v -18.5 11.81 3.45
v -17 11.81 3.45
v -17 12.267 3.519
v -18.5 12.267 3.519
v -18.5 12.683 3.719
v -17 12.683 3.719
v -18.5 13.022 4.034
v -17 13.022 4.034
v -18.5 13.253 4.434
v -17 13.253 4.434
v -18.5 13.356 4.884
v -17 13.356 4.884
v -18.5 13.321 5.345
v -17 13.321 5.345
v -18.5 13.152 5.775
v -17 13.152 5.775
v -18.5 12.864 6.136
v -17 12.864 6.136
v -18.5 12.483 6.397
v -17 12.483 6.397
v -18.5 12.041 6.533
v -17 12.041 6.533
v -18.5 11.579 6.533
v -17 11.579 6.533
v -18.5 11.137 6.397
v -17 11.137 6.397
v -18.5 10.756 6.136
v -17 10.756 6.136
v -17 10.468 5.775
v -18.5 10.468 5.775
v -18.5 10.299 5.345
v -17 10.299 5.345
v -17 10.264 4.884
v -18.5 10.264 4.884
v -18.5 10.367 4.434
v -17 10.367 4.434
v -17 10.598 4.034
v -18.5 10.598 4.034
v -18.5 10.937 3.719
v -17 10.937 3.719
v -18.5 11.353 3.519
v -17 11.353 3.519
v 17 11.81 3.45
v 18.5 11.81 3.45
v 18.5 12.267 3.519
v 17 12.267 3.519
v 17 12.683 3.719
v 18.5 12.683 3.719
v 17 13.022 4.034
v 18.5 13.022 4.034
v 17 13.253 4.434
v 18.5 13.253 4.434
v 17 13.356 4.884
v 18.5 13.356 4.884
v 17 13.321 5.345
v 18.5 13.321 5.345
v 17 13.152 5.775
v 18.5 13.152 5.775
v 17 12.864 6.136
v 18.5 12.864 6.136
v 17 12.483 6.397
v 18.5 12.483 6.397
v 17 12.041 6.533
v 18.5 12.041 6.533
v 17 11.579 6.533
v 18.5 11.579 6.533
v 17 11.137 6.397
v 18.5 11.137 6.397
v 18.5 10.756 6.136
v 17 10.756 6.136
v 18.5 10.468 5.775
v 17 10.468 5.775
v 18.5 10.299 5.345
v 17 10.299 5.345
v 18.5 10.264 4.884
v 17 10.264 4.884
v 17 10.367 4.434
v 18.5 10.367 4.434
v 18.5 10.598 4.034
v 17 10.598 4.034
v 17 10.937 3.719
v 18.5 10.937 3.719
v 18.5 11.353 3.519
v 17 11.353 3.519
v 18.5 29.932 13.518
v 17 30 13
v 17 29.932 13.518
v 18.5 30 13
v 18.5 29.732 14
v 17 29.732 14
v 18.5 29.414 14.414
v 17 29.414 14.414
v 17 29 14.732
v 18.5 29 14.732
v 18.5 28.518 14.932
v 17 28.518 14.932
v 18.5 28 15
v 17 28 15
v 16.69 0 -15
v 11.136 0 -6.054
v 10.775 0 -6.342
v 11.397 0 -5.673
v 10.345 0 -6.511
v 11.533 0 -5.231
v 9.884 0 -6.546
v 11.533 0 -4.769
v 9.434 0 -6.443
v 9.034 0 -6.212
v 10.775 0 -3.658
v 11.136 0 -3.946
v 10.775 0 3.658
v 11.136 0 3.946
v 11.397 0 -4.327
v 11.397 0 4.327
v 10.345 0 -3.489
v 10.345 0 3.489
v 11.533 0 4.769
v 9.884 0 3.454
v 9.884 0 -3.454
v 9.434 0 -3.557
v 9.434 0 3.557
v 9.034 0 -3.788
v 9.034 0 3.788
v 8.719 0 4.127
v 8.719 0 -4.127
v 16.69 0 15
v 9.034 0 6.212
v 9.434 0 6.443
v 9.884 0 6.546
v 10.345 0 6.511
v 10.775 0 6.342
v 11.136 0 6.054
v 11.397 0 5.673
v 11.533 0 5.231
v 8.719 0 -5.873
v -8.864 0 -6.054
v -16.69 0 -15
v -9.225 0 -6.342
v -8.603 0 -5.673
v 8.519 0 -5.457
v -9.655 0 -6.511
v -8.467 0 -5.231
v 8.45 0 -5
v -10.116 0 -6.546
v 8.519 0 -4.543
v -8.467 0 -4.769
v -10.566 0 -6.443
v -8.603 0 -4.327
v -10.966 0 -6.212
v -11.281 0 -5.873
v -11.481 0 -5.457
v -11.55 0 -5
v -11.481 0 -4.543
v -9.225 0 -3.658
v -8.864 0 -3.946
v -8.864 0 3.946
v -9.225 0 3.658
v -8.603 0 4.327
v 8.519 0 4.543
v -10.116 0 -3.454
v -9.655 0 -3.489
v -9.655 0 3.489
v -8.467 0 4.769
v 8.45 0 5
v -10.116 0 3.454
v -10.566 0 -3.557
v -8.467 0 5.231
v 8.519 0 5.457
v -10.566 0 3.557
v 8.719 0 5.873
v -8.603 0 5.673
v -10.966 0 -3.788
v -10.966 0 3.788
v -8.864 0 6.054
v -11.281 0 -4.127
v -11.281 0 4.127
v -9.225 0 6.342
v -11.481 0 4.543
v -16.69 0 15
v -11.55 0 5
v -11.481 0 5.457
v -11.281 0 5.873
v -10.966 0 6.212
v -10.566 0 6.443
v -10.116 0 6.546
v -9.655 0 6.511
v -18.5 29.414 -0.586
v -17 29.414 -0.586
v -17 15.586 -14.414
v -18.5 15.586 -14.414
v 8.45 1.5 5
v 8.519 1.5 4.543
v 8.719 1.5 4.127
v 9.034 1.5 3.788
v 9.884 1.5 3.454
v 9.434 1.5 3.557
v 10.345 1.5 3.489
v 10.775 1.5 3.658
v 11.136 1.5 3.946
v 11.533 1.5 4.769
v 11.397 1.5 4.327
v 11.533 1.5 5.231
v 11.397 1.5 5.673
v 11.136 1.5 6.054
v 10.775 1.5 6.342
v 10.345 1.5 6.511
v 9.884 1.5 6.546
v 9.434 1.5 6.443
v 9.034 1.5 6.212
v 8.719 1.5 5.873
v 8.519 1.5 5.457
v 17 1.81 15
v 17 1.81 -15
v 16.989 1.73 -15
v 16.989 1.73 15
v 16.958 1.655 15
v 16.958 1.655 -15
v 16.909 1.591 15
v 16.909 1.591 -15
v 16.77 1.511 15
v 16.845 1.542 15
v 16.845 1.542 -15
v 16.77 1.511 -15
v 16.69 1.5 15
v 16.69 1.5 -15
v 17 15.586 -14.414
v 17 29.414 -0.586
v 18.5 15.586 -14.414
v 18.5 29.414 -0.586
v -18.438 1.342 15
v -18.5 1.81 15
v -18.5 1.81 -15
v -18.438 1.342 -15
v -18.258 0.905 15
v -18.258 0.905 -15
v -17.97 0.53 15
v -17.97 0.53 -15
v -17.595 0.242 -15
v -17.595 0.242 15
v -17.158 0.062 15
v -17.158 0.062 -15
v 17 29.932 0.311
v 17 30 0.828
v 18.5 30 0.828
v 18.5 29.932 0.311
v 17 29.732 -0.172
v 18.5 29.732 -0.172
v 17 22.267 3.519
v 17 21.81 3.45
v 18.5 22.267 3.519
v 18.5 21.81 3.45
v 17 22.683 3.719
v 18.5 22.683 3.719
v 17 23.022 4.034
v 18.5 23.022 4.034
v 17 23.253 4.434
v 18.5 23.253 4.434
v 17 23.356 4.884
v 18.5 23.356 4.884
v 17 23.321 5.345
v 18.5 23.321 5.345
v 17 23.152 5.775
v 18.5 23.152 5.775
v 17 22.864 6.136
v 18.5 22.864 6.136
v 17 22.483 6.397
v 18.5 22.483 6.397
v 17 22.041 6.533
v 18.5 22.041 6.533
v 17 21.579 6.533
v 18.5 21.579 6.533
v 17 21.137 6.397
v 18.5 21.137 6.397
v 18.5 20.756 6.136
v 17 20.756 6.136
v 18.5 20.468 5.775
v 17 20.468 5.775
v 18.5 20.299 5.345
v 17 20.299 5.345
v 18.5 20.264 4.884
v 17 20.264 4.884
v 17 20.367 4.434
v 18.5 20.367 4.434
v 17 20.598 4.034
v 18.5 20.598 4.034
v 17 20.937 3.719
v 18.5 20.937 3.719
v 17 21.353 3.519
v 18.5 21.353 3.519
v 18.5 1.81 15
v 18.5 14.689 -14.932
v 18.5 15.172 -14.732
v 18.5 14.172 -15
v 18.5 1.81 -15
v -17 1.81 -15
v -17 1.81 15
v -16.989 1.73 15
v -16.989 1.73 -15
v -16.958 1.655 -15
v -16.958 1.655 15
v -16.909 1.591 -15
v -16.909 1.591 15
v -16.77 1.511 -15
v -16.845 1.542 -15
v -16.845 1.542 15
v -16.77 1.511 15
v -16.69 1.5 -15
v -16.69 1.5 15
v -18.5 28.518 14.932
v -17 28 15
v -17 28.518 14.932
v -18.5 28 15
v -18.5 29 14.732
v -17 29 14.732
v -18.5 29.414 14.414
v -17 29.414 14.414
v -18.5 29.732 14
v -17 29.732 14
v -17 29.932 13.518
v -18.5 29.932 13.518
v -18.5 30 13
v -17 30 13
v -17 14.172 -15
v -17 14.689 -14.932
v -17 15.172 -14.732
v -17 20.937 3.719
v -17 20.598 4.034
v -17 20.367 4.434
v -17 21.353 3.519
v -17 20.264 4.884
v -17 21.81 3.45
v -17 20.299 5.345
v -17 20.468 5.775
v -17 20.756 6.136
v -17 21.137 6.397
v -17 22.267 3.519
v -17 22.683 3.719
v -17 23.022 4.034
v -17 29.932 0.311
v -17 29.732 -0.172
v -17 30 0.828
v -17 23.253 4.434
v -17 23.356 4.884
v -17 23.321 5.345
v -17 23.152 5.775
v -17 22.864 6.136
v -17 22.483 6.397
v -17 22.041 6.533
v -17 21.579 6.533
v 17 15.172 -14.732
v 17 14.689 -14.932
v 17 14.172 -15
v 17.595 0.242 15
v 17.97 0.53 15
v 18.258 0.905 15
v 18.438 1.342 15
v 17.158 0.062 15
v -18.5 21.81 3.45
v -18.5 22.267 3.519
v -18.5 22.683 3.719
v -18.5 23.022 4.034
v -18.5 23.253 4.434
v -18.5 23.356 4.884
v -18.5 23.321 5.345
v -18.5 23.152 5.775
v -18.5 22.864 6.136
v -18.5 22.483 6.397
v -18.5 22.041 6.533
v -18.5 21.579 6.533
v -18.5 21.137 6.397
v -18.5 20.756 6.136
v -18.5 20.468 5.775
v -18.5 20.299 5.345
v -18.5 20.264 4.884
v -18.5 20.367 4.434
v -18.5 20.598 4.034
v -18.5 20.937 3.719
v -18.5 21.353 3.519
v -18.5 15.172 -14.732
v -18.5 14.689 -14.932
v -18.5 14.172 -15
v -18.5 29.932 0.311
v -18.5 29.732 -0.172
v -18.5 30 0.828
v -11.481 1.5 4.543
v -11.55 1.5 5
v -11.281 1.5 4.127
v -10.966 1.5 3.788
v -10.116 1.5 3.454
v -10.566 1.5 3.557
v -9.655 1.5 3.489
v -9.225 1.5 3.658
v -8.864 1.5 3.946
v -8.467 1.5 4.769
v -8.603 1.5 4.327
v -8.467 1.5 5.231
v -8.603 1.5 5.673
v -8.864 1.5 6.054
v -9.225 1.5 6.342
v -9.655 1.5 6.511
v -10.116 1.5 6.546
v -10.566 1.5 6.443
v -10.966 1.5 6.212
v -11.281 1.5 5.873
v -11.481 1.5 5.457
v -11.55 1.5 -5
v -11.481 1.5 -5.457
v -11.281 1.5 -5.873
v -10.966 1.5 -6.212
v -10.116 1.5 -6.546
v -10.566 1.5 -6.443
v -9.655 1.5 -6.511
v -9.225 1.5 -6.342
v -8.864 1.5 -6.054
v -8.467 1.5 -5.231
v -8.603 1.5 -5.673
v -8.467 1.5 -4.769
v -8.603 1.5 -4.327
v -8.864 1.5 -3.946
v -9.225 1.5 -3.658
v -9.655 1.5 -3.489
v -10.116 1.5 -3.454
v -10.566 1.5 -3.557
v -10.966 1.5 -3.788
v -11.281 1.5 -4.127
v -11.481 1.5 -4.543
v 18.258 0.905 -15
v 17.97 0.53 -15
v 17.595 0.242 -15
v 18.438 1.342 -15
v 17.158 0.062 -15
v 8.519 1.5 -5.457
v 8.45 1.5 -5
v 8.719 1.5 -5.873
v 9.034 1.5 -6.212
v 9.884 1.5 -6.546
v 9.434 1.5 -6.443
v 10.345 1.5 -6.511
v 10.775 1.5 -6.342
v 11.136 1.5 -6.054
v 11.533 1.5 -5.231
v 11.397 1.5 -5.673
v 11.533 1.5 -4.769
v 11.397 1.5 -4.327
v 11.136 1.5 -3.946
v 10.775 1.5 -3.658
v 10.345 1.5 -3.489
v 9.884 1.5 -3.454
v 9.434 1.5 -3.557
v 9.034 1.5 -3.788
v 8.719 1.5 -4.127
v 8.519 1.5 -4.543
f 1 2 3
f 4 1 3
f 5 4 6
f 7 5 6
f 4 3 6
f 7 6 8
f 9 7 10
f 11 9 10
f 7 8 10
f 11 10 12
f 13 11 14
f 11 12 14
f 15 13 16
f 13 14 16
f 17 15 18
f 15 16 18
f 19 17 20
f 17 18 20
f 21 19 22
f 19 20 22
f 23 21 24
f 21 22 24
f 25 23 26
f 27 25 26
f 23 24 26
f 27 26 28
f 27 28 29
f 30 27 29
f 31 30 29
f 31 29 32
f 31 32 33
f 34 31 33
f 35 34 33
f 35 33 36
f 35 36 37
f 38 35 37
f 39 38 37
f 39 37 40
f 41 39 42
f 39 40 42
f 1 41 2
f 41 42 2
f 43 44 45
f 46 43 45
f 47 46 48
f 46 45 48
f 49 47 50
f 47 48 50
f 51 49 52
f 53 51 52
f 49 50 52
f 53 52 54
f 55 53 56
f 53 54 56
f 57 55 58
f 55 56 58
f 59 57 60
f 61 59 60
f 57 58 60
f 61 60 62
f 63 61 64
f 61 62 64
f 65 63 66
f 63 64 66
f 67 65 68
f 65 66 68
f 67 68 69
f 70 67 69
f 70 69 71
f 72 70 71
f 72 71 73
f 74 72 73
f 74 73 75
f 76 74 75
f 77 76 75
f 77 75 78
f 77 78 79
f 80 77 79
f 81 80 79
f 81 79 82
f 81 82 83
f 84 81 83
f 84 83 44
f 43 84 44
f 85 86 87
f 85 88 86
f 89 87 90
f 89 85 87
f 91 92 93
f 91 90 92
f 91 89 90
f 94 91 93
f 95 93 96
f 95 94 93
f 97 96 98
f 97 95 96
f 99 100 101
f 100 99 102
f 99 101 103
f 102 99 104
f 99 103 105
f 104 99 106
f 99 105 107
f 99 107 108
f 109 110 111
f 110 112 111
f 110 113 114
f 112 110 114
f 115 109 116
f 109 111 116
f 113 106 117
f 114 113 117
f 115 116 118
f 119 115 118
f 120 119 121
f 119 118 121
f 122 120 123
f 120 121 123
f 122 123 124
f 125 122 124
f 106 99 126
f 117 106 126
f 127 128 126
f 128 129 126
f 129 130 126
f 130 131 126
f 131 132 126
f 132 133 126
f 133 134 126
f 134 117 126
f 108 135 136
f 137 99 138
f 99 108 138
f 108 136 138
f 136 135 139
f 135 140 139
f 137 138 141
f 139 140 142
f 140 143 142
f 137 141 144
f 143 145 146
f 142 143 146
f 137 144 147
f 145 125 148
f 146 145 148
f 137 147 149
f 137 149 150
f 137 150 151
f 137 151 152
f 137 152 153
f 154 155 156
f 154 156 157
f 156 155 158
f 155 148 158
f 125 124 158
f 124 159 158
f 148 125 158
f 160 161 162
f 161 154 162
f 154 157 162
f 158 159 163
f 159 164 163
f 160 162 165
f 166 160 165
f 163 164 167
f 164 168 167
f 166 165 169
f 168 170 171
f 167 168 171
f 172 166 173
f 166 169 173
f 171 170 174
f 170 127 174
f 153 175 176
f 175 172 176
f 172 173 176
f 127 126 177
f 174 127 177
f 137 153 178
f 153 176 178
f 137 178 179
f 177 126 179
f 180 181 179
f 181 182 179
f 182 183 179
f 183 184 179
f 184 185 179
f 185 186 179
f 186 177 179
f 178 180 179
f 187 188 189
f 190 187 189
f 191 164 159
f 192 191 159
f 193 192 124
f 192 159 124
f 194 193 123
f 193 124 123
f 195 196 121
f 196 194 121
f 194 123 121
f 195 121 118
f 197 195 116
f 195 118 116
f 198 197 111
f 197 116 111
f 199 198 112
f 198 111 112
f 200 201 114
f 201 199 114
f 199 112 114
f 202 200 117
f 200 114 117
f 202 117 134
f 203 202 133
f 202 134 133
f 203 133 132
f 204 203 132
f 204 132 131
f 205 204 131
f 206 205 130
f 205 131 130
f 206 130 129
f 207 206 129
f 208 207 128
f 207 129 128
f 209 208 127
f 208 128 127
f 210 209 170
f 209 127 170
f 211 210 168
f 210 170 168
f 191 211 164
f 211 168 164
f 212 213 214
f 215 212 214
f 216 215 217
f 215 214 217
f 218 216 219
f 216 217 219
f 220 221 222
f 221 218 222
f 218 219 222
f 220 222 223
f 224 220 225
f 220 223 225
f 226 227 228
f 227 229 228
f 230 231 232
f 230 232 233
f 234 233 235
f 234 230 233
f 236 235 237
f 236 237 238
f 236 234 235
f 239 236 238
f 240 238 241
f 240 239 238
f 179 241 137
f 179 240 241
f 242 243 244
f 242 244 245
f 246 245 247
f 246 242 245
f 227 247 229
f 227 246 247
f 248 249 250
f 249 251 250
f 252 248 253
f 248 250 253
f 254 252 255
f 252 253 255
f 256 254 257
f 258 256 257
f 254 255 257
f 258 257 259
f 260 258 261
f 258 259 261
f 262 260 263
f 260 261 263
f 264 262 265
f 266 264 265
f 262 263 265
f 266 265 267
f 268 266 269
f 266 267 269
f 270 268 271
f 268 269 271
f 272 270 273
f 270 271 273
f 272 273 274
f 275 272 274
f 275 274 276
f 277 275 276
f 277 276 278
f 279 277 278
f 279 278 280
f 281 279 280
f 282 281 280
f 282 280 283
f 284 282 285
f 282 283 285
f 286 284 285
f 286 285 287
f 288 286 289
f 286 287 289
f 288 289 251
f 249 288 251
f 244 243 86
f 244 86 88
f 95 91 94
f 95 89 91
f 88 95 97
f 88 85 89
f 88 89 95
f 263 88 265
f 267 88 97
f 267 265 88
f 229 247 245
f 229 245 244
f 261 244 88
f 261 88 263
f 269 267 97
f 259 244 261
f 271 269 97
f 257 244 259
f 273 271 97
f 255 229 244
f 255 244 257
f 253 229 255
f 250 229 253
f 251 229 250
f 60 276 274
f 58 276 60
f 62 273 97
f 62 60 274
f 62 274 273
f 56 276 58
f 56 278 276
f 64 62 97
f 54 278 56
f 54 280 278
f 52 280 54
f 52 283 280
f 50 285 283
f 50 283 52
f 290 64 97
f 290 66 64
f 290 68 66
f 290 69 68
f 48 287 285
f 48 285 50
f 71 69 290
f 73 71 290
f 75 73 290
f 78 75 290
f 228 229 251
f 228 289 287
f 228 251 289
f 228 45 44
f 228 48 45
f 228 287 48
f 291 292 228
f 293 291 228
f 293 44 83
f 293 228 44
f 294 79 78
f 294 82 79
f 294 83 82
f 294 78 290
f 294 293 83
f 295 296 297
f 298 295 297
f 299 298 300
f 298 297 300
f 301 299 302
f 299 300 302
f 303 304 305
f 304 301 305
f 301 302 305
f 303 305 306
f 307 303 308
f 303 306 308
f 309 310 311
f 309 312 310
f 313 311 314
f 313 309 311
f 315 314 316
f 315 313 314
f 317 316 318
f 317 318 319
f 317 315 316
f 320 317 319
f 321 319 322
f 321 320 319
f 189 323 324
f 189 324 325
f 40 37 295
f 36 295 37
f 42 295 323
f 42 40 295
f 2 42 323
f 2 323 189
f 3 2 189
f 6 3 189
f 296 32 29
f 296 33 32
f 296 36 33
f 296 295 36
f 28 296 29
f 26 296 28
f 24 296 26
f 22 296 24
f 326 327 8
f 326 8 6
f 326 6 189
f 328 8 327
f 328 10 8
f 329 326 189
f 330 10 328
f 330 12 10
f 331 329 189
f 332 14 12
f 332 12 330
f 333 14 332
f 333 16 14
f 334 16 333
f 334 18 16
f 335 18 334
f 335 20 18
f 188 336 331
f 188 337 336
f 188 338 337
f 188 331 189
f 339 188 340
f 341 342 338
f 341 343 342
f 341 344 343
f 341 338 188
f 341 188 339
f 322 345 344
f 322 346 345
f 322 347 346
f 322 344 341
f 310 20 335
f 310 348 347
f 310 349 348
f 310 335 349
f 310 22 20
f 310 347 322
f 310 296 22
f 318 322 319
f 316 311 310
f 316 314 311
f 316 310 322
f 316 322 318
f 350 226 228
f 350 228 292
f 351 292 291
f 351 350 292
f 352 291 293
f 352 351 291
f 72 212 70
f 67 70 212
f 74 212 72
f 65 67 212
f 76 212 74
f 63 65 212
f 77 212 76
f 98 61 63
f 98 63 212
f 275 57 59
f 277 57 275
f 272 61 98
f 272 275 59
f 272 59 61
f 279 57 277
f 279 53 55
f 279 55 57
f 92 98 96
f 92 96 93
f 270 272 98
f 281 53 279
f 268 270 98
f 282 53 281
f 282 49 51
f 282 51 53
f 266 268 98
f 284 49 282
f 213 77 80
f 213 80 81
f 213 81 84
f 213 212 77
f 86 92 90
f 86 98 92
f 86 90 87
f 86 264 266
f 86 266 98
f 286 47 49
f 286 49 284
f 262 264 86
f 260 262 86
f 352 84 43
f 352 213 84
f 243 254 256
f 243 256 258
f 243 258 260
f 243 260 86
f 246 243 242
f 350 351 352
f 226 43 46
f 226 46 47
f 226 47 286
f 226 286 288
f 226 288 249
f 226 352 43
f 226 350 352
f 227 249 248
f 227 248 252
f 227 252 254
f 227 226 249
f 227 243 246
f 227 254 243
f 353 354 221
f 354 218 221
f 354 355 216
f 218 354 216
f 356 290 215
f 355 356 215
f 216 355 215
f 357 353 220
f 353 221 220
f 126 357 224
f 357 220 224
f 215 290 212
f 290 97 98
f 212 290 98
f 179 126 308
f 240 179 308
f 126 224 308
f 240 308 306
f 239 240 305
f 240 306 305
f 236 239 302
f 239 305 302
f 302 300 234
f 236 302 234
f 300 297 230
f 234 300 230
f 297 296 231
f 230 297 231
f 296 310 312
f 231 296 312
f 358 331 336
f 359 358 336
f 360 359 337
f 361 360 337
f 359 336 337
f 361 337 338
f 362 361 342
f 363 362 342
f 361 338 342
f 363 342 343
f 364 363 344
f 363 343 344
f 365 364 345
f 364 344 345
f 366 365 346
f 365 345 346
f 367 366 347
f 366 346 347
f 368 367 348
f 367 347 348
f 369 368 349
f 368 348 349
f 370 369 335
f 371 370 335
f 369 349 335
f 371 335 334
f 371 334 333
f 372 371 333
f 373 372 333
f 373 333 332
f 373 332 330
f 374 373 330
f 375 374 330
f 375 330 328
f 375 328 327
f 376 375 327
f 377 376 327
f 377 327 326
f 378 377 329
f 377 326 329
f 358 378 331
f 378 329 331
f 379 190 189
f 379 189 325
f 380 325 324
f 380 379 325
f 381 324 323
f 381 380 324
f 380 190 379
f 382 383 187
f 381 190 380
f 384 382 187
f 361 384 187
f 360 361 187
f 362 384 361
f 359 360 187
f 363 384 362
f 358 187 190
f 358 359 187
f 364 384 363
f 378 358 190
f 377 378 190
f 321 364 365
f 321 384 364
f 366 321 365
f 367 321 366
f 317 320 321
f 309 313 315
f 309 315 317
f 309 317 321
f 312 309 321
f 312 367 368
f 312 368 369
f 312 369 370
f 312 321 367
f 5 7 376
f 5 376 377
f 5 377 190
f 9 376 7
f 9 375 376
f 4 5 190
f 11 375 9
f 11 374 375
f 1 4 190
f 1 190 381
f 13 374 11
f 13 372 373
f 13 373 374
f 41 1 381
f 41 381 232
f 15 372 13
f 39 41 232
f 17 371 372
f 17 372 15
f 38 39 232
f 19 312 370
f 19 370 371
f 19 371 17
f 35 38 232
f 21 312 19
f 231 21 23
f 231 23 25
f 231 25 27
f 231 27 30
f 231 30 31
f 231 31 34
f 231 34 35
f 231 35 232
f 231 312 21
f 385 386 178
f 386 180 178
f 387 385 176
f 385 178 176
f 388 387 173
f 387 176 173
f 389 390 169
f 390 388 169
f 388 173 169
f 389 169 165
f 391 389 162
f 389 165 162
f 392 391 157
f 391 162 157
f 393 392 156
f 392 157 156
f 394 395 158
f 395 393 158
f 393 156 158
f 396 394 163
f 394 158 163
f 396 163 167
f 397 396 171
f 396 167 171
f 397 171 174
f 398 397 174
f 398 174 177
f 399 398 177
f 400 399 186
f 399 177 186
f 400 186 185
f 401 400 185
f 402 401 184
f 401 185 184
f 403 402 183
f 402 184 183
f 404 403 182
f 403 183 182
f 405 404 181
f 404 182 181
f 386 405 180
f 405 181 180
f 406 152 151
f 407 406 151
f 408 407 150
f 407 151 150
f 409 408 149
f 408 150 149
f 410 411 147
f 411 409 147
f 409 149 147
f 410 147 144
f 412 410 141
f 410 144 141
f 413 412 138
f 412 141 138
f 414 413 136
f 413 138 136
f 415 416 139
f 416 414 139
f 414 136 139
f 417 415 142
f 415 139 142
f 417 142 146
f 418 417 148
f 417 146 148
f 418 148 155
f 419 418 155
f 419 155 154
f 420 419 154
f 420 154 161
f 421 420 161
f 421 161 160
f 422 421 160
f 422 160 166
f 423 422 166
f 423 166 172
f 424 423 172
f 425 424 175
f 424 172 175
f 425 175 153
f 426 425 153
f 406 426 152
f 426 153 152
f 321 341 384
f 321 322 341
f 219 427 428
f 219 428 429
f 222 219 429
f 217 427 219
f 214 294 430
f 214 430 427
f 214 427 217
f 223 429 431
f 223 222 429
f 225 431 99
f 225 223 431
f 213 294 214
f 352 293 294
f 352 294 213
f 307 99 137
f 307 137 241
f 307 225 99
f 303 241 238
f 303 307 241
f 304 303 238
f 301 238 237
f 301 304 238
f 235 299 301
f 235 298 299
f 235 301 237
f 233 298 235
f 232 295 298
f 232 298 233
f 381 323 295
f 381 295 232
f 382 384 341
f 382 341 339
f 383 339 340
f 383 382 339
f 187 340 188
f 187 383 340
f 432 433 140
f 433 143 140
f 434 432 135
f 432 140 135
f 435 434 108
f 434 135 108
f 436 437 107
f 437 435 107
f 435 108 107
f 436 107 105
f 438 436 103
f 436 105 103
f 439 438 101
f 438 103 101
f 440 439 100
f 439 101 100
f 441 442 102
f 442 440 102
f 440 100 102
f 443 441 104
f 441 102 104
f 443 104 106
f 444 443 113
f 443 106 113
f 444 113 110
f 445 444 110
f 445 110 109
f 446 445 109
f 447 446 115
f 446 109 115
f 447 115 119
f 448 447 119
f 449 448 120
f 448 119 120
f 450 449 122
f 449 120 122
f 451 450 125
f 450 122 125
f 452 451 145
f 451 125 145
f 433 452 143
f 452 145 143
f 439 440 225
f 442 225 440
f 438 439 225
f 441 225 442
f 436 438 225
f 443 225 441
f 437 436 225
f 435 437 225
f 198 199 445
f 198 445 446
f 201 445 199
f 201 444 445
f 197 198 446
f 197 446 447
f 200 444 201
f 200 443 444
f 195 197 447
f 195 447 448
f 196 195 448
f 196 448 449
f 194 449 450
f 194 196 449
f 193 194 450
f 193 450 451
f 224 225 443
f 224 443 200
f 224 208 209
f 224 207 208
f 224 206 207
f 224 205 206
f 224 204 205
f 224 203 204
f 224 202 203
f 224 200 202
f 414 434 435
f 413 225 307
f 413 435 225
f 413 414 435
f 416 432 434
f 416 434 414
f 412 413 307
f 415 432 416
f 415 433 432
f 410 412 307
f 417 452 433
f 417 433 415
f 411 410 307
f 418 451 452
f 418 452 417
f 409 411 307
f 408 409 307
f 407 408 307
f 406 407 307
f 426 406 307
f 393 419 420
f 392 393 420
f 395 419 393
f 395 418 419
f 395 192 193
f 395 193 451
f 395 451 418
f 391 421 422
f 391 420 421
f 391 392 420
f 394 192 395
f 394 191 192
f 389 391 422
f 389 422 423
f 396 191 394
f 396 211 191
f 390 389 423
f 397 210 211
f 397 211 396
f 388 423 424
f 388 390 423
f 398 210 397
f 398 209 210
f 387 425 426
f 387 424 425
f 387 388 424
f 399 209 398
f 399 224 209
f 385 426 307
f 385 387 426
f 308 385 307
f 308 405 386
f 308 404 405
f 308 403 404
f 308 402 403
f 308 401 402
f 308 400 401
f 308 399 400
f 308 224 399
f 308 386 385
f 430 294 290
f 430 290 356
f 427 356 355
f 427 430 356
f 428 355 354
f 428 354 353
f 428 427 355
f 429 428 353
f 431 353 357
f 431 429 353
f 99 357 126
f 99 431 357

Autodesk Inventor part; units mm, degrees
ref_plane "YZ Plane" through (0, 0, 0) normal (1, 0, 0) x (0, 1, 0)
ref_plane "XZ Plane" through (0, 0, 0) normal (0, 1, 0) x (-1, 0, 0)
ref_plane "XY Plane" through (0, 0, 0) normal (0, 0, 1) x (1, 0, 0)
sketch "Sketch1" plane through (0, 0, 0) normal (0, 1, 0) x (-1, 0, 0)
  line L0 (18.5, 15) -> (-18.5, 15)
  line L1 (-18.5, 15) -> (-18.5, -15)
  line L2 (-18.5, -15) -> (18.5, -15)
  line L3 (18.5, -15) -> (18.5, 15)
  line L4 (18.5, 15) -> (-18.5, -15) construction
  line L5 (-18.5, 15) -> (18.5, -15) construction
  circle A0 centre (10, 5) radius 1.55
  circle A1 centre (10, -5) radius 1.55
  circle A2 centre (-10, 5) radius 1.55
  circle A3 centre (-10, -5) radius 1.55
  point P0 (0, 0)
  dimension "d0" = 37
  dimension "d1" = 30
  dimension "d2" = 3.1
  dimension "d3" = 3.1
  dimension "d4" = 3.1
  dimension "d5" = 3.1
  dimension "d6" = 20
  dimension "d7" = 20
  dimension "d8" = 10
  dimension "d10" = 10
  dimension "d11" = 0
  dimension "d12" = 0
  dimension "d13" = 10
  dimension "d14" = 8.5
extrude "Plate1" add sketch "Sketch1" along normal blind 1.5
sketch "Sketch2" plane through (17, 0, -15) normal (1, 0, 0) x (0, 1, 0)
  line L0 (0, 30) -> (0, 0)
  line L1 (0, 0) -> (30, 0)
  line L2 (30, 0) -> (30, 30)
  line L3 (30, 30) -> (0, 30)
edge flange "Flange1" height 30 angle 90 thickness 1.5 bend radius 0.31 thickness toward (1, 0, 0) relief tear relief width 1.5 relief depth 0.75 corner gap 0.31 corner form 0 edges at (18.5, 1.5, 0) (-18.5, 1.5, 0) wall of the first edge with corners at (17, 0, 15) (17, 0, -15) (17, 30, -15) (17, 30, 15)
bend "Bend1"
corner "Corner1"
sketch "Sketch3" plane through (18.5, 30, 15) normal (1, 0, 0) x (0, 0, -1)
  circle A0 centre (10, -8.19) radius 1.55
  circle A1 centre (10, -18.19) radius 1.55
  line L0 (0, -28.19) -> (0, 0) projected
  line L1 (0, -28.19) -> (30, -28.19) projected
  point P0 (15, -30)
  dimension "d26" = 3.1
  dimension "d27" = 3.1
  dimension "d28" = 10
  dimension "d29" = 10
  dimension "d30" = 10
  dimension "d31" = 10
extrude "Cut1" cut sketch "Sketch3" against normal through all
sketch "Sketch5" plane through (18.5, 30, 15) normal (1, 0, 0) x (0, 0, -1)
  line L0 (15, 0) -> (30, -15)
  line L1 (30, -15) -> (30, 0)
  line L2 (30, 0) -> (15, 0)
  line L3 (30, 0) -> (30, -28.19) projected
  line L4 (0, 0) -> (30, 0) projected
  point P0 (15, -30)
  dimension "d36" = 15
  dimension "d37" = 15
extrude "Cut2" cut sketch "Sketch5" against normal through all
fillet "Fillet1" radius 2 6 edges at (17.75, 30, 15) (17.75, 30, 0) (17.75, 15, -15) (-17.75, 30, 15) (-17.75, 30, 0) (-17.75, 15, -15)
equation "\"d7\" = d6"
equation "\"d10\" = d8"
equation "\"d32\" = Thickness"
equation "\"d38\" = Thickness"
equation "\"d15\" = Thickness"
equation "\"d16\" = BendReliefWidth"
equation "\"d17\" = BendReliefDepth"
equation "\"d18\" = MinimumRemnant"
equation "\"d19\" = TransitionRadius"
equation "\"d22\" = BendRadius"
equation "\"d23\" = CornerReliefSize"
equation "\"d24\" = GapSize"
equation "\"d25\" = JacobiRadiusSize"
equation "\"BendReliefWidth\" = Thickness"
equation "\"BendReliefDepth\" = 0.5 * Thickness"
equation "\"CornerReliefSize\" = 4 * Thickness"
equation "\"MinimumRemnant\" = 2 * Thickness"
equation "\"TransitionRadius\" = BendRadius"
equation "\"JacobiRadiusSize\" = BendRadius"
equation "\"GapSize\" = Thickness"
equation "\"Thickness\" = 1.5"
equation "\"BendRadius\" = 0.31"
properties part number "Head1" material "Aluminum 6061-AHC"
